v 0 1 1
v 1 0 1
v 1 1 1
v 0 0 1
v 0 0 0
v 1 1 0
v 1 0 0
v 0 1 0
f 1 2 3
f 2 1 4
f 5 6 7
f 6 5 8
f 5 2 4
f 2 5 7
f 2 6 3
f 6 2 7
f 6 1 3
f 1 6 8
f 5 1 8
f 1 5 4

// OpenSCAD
minkowski() {
  cube();
  linear_extrude() {
    import("notfound.dxf");
  }
  linear_extrude() {
    import("notfound.dxf");
  }
}
